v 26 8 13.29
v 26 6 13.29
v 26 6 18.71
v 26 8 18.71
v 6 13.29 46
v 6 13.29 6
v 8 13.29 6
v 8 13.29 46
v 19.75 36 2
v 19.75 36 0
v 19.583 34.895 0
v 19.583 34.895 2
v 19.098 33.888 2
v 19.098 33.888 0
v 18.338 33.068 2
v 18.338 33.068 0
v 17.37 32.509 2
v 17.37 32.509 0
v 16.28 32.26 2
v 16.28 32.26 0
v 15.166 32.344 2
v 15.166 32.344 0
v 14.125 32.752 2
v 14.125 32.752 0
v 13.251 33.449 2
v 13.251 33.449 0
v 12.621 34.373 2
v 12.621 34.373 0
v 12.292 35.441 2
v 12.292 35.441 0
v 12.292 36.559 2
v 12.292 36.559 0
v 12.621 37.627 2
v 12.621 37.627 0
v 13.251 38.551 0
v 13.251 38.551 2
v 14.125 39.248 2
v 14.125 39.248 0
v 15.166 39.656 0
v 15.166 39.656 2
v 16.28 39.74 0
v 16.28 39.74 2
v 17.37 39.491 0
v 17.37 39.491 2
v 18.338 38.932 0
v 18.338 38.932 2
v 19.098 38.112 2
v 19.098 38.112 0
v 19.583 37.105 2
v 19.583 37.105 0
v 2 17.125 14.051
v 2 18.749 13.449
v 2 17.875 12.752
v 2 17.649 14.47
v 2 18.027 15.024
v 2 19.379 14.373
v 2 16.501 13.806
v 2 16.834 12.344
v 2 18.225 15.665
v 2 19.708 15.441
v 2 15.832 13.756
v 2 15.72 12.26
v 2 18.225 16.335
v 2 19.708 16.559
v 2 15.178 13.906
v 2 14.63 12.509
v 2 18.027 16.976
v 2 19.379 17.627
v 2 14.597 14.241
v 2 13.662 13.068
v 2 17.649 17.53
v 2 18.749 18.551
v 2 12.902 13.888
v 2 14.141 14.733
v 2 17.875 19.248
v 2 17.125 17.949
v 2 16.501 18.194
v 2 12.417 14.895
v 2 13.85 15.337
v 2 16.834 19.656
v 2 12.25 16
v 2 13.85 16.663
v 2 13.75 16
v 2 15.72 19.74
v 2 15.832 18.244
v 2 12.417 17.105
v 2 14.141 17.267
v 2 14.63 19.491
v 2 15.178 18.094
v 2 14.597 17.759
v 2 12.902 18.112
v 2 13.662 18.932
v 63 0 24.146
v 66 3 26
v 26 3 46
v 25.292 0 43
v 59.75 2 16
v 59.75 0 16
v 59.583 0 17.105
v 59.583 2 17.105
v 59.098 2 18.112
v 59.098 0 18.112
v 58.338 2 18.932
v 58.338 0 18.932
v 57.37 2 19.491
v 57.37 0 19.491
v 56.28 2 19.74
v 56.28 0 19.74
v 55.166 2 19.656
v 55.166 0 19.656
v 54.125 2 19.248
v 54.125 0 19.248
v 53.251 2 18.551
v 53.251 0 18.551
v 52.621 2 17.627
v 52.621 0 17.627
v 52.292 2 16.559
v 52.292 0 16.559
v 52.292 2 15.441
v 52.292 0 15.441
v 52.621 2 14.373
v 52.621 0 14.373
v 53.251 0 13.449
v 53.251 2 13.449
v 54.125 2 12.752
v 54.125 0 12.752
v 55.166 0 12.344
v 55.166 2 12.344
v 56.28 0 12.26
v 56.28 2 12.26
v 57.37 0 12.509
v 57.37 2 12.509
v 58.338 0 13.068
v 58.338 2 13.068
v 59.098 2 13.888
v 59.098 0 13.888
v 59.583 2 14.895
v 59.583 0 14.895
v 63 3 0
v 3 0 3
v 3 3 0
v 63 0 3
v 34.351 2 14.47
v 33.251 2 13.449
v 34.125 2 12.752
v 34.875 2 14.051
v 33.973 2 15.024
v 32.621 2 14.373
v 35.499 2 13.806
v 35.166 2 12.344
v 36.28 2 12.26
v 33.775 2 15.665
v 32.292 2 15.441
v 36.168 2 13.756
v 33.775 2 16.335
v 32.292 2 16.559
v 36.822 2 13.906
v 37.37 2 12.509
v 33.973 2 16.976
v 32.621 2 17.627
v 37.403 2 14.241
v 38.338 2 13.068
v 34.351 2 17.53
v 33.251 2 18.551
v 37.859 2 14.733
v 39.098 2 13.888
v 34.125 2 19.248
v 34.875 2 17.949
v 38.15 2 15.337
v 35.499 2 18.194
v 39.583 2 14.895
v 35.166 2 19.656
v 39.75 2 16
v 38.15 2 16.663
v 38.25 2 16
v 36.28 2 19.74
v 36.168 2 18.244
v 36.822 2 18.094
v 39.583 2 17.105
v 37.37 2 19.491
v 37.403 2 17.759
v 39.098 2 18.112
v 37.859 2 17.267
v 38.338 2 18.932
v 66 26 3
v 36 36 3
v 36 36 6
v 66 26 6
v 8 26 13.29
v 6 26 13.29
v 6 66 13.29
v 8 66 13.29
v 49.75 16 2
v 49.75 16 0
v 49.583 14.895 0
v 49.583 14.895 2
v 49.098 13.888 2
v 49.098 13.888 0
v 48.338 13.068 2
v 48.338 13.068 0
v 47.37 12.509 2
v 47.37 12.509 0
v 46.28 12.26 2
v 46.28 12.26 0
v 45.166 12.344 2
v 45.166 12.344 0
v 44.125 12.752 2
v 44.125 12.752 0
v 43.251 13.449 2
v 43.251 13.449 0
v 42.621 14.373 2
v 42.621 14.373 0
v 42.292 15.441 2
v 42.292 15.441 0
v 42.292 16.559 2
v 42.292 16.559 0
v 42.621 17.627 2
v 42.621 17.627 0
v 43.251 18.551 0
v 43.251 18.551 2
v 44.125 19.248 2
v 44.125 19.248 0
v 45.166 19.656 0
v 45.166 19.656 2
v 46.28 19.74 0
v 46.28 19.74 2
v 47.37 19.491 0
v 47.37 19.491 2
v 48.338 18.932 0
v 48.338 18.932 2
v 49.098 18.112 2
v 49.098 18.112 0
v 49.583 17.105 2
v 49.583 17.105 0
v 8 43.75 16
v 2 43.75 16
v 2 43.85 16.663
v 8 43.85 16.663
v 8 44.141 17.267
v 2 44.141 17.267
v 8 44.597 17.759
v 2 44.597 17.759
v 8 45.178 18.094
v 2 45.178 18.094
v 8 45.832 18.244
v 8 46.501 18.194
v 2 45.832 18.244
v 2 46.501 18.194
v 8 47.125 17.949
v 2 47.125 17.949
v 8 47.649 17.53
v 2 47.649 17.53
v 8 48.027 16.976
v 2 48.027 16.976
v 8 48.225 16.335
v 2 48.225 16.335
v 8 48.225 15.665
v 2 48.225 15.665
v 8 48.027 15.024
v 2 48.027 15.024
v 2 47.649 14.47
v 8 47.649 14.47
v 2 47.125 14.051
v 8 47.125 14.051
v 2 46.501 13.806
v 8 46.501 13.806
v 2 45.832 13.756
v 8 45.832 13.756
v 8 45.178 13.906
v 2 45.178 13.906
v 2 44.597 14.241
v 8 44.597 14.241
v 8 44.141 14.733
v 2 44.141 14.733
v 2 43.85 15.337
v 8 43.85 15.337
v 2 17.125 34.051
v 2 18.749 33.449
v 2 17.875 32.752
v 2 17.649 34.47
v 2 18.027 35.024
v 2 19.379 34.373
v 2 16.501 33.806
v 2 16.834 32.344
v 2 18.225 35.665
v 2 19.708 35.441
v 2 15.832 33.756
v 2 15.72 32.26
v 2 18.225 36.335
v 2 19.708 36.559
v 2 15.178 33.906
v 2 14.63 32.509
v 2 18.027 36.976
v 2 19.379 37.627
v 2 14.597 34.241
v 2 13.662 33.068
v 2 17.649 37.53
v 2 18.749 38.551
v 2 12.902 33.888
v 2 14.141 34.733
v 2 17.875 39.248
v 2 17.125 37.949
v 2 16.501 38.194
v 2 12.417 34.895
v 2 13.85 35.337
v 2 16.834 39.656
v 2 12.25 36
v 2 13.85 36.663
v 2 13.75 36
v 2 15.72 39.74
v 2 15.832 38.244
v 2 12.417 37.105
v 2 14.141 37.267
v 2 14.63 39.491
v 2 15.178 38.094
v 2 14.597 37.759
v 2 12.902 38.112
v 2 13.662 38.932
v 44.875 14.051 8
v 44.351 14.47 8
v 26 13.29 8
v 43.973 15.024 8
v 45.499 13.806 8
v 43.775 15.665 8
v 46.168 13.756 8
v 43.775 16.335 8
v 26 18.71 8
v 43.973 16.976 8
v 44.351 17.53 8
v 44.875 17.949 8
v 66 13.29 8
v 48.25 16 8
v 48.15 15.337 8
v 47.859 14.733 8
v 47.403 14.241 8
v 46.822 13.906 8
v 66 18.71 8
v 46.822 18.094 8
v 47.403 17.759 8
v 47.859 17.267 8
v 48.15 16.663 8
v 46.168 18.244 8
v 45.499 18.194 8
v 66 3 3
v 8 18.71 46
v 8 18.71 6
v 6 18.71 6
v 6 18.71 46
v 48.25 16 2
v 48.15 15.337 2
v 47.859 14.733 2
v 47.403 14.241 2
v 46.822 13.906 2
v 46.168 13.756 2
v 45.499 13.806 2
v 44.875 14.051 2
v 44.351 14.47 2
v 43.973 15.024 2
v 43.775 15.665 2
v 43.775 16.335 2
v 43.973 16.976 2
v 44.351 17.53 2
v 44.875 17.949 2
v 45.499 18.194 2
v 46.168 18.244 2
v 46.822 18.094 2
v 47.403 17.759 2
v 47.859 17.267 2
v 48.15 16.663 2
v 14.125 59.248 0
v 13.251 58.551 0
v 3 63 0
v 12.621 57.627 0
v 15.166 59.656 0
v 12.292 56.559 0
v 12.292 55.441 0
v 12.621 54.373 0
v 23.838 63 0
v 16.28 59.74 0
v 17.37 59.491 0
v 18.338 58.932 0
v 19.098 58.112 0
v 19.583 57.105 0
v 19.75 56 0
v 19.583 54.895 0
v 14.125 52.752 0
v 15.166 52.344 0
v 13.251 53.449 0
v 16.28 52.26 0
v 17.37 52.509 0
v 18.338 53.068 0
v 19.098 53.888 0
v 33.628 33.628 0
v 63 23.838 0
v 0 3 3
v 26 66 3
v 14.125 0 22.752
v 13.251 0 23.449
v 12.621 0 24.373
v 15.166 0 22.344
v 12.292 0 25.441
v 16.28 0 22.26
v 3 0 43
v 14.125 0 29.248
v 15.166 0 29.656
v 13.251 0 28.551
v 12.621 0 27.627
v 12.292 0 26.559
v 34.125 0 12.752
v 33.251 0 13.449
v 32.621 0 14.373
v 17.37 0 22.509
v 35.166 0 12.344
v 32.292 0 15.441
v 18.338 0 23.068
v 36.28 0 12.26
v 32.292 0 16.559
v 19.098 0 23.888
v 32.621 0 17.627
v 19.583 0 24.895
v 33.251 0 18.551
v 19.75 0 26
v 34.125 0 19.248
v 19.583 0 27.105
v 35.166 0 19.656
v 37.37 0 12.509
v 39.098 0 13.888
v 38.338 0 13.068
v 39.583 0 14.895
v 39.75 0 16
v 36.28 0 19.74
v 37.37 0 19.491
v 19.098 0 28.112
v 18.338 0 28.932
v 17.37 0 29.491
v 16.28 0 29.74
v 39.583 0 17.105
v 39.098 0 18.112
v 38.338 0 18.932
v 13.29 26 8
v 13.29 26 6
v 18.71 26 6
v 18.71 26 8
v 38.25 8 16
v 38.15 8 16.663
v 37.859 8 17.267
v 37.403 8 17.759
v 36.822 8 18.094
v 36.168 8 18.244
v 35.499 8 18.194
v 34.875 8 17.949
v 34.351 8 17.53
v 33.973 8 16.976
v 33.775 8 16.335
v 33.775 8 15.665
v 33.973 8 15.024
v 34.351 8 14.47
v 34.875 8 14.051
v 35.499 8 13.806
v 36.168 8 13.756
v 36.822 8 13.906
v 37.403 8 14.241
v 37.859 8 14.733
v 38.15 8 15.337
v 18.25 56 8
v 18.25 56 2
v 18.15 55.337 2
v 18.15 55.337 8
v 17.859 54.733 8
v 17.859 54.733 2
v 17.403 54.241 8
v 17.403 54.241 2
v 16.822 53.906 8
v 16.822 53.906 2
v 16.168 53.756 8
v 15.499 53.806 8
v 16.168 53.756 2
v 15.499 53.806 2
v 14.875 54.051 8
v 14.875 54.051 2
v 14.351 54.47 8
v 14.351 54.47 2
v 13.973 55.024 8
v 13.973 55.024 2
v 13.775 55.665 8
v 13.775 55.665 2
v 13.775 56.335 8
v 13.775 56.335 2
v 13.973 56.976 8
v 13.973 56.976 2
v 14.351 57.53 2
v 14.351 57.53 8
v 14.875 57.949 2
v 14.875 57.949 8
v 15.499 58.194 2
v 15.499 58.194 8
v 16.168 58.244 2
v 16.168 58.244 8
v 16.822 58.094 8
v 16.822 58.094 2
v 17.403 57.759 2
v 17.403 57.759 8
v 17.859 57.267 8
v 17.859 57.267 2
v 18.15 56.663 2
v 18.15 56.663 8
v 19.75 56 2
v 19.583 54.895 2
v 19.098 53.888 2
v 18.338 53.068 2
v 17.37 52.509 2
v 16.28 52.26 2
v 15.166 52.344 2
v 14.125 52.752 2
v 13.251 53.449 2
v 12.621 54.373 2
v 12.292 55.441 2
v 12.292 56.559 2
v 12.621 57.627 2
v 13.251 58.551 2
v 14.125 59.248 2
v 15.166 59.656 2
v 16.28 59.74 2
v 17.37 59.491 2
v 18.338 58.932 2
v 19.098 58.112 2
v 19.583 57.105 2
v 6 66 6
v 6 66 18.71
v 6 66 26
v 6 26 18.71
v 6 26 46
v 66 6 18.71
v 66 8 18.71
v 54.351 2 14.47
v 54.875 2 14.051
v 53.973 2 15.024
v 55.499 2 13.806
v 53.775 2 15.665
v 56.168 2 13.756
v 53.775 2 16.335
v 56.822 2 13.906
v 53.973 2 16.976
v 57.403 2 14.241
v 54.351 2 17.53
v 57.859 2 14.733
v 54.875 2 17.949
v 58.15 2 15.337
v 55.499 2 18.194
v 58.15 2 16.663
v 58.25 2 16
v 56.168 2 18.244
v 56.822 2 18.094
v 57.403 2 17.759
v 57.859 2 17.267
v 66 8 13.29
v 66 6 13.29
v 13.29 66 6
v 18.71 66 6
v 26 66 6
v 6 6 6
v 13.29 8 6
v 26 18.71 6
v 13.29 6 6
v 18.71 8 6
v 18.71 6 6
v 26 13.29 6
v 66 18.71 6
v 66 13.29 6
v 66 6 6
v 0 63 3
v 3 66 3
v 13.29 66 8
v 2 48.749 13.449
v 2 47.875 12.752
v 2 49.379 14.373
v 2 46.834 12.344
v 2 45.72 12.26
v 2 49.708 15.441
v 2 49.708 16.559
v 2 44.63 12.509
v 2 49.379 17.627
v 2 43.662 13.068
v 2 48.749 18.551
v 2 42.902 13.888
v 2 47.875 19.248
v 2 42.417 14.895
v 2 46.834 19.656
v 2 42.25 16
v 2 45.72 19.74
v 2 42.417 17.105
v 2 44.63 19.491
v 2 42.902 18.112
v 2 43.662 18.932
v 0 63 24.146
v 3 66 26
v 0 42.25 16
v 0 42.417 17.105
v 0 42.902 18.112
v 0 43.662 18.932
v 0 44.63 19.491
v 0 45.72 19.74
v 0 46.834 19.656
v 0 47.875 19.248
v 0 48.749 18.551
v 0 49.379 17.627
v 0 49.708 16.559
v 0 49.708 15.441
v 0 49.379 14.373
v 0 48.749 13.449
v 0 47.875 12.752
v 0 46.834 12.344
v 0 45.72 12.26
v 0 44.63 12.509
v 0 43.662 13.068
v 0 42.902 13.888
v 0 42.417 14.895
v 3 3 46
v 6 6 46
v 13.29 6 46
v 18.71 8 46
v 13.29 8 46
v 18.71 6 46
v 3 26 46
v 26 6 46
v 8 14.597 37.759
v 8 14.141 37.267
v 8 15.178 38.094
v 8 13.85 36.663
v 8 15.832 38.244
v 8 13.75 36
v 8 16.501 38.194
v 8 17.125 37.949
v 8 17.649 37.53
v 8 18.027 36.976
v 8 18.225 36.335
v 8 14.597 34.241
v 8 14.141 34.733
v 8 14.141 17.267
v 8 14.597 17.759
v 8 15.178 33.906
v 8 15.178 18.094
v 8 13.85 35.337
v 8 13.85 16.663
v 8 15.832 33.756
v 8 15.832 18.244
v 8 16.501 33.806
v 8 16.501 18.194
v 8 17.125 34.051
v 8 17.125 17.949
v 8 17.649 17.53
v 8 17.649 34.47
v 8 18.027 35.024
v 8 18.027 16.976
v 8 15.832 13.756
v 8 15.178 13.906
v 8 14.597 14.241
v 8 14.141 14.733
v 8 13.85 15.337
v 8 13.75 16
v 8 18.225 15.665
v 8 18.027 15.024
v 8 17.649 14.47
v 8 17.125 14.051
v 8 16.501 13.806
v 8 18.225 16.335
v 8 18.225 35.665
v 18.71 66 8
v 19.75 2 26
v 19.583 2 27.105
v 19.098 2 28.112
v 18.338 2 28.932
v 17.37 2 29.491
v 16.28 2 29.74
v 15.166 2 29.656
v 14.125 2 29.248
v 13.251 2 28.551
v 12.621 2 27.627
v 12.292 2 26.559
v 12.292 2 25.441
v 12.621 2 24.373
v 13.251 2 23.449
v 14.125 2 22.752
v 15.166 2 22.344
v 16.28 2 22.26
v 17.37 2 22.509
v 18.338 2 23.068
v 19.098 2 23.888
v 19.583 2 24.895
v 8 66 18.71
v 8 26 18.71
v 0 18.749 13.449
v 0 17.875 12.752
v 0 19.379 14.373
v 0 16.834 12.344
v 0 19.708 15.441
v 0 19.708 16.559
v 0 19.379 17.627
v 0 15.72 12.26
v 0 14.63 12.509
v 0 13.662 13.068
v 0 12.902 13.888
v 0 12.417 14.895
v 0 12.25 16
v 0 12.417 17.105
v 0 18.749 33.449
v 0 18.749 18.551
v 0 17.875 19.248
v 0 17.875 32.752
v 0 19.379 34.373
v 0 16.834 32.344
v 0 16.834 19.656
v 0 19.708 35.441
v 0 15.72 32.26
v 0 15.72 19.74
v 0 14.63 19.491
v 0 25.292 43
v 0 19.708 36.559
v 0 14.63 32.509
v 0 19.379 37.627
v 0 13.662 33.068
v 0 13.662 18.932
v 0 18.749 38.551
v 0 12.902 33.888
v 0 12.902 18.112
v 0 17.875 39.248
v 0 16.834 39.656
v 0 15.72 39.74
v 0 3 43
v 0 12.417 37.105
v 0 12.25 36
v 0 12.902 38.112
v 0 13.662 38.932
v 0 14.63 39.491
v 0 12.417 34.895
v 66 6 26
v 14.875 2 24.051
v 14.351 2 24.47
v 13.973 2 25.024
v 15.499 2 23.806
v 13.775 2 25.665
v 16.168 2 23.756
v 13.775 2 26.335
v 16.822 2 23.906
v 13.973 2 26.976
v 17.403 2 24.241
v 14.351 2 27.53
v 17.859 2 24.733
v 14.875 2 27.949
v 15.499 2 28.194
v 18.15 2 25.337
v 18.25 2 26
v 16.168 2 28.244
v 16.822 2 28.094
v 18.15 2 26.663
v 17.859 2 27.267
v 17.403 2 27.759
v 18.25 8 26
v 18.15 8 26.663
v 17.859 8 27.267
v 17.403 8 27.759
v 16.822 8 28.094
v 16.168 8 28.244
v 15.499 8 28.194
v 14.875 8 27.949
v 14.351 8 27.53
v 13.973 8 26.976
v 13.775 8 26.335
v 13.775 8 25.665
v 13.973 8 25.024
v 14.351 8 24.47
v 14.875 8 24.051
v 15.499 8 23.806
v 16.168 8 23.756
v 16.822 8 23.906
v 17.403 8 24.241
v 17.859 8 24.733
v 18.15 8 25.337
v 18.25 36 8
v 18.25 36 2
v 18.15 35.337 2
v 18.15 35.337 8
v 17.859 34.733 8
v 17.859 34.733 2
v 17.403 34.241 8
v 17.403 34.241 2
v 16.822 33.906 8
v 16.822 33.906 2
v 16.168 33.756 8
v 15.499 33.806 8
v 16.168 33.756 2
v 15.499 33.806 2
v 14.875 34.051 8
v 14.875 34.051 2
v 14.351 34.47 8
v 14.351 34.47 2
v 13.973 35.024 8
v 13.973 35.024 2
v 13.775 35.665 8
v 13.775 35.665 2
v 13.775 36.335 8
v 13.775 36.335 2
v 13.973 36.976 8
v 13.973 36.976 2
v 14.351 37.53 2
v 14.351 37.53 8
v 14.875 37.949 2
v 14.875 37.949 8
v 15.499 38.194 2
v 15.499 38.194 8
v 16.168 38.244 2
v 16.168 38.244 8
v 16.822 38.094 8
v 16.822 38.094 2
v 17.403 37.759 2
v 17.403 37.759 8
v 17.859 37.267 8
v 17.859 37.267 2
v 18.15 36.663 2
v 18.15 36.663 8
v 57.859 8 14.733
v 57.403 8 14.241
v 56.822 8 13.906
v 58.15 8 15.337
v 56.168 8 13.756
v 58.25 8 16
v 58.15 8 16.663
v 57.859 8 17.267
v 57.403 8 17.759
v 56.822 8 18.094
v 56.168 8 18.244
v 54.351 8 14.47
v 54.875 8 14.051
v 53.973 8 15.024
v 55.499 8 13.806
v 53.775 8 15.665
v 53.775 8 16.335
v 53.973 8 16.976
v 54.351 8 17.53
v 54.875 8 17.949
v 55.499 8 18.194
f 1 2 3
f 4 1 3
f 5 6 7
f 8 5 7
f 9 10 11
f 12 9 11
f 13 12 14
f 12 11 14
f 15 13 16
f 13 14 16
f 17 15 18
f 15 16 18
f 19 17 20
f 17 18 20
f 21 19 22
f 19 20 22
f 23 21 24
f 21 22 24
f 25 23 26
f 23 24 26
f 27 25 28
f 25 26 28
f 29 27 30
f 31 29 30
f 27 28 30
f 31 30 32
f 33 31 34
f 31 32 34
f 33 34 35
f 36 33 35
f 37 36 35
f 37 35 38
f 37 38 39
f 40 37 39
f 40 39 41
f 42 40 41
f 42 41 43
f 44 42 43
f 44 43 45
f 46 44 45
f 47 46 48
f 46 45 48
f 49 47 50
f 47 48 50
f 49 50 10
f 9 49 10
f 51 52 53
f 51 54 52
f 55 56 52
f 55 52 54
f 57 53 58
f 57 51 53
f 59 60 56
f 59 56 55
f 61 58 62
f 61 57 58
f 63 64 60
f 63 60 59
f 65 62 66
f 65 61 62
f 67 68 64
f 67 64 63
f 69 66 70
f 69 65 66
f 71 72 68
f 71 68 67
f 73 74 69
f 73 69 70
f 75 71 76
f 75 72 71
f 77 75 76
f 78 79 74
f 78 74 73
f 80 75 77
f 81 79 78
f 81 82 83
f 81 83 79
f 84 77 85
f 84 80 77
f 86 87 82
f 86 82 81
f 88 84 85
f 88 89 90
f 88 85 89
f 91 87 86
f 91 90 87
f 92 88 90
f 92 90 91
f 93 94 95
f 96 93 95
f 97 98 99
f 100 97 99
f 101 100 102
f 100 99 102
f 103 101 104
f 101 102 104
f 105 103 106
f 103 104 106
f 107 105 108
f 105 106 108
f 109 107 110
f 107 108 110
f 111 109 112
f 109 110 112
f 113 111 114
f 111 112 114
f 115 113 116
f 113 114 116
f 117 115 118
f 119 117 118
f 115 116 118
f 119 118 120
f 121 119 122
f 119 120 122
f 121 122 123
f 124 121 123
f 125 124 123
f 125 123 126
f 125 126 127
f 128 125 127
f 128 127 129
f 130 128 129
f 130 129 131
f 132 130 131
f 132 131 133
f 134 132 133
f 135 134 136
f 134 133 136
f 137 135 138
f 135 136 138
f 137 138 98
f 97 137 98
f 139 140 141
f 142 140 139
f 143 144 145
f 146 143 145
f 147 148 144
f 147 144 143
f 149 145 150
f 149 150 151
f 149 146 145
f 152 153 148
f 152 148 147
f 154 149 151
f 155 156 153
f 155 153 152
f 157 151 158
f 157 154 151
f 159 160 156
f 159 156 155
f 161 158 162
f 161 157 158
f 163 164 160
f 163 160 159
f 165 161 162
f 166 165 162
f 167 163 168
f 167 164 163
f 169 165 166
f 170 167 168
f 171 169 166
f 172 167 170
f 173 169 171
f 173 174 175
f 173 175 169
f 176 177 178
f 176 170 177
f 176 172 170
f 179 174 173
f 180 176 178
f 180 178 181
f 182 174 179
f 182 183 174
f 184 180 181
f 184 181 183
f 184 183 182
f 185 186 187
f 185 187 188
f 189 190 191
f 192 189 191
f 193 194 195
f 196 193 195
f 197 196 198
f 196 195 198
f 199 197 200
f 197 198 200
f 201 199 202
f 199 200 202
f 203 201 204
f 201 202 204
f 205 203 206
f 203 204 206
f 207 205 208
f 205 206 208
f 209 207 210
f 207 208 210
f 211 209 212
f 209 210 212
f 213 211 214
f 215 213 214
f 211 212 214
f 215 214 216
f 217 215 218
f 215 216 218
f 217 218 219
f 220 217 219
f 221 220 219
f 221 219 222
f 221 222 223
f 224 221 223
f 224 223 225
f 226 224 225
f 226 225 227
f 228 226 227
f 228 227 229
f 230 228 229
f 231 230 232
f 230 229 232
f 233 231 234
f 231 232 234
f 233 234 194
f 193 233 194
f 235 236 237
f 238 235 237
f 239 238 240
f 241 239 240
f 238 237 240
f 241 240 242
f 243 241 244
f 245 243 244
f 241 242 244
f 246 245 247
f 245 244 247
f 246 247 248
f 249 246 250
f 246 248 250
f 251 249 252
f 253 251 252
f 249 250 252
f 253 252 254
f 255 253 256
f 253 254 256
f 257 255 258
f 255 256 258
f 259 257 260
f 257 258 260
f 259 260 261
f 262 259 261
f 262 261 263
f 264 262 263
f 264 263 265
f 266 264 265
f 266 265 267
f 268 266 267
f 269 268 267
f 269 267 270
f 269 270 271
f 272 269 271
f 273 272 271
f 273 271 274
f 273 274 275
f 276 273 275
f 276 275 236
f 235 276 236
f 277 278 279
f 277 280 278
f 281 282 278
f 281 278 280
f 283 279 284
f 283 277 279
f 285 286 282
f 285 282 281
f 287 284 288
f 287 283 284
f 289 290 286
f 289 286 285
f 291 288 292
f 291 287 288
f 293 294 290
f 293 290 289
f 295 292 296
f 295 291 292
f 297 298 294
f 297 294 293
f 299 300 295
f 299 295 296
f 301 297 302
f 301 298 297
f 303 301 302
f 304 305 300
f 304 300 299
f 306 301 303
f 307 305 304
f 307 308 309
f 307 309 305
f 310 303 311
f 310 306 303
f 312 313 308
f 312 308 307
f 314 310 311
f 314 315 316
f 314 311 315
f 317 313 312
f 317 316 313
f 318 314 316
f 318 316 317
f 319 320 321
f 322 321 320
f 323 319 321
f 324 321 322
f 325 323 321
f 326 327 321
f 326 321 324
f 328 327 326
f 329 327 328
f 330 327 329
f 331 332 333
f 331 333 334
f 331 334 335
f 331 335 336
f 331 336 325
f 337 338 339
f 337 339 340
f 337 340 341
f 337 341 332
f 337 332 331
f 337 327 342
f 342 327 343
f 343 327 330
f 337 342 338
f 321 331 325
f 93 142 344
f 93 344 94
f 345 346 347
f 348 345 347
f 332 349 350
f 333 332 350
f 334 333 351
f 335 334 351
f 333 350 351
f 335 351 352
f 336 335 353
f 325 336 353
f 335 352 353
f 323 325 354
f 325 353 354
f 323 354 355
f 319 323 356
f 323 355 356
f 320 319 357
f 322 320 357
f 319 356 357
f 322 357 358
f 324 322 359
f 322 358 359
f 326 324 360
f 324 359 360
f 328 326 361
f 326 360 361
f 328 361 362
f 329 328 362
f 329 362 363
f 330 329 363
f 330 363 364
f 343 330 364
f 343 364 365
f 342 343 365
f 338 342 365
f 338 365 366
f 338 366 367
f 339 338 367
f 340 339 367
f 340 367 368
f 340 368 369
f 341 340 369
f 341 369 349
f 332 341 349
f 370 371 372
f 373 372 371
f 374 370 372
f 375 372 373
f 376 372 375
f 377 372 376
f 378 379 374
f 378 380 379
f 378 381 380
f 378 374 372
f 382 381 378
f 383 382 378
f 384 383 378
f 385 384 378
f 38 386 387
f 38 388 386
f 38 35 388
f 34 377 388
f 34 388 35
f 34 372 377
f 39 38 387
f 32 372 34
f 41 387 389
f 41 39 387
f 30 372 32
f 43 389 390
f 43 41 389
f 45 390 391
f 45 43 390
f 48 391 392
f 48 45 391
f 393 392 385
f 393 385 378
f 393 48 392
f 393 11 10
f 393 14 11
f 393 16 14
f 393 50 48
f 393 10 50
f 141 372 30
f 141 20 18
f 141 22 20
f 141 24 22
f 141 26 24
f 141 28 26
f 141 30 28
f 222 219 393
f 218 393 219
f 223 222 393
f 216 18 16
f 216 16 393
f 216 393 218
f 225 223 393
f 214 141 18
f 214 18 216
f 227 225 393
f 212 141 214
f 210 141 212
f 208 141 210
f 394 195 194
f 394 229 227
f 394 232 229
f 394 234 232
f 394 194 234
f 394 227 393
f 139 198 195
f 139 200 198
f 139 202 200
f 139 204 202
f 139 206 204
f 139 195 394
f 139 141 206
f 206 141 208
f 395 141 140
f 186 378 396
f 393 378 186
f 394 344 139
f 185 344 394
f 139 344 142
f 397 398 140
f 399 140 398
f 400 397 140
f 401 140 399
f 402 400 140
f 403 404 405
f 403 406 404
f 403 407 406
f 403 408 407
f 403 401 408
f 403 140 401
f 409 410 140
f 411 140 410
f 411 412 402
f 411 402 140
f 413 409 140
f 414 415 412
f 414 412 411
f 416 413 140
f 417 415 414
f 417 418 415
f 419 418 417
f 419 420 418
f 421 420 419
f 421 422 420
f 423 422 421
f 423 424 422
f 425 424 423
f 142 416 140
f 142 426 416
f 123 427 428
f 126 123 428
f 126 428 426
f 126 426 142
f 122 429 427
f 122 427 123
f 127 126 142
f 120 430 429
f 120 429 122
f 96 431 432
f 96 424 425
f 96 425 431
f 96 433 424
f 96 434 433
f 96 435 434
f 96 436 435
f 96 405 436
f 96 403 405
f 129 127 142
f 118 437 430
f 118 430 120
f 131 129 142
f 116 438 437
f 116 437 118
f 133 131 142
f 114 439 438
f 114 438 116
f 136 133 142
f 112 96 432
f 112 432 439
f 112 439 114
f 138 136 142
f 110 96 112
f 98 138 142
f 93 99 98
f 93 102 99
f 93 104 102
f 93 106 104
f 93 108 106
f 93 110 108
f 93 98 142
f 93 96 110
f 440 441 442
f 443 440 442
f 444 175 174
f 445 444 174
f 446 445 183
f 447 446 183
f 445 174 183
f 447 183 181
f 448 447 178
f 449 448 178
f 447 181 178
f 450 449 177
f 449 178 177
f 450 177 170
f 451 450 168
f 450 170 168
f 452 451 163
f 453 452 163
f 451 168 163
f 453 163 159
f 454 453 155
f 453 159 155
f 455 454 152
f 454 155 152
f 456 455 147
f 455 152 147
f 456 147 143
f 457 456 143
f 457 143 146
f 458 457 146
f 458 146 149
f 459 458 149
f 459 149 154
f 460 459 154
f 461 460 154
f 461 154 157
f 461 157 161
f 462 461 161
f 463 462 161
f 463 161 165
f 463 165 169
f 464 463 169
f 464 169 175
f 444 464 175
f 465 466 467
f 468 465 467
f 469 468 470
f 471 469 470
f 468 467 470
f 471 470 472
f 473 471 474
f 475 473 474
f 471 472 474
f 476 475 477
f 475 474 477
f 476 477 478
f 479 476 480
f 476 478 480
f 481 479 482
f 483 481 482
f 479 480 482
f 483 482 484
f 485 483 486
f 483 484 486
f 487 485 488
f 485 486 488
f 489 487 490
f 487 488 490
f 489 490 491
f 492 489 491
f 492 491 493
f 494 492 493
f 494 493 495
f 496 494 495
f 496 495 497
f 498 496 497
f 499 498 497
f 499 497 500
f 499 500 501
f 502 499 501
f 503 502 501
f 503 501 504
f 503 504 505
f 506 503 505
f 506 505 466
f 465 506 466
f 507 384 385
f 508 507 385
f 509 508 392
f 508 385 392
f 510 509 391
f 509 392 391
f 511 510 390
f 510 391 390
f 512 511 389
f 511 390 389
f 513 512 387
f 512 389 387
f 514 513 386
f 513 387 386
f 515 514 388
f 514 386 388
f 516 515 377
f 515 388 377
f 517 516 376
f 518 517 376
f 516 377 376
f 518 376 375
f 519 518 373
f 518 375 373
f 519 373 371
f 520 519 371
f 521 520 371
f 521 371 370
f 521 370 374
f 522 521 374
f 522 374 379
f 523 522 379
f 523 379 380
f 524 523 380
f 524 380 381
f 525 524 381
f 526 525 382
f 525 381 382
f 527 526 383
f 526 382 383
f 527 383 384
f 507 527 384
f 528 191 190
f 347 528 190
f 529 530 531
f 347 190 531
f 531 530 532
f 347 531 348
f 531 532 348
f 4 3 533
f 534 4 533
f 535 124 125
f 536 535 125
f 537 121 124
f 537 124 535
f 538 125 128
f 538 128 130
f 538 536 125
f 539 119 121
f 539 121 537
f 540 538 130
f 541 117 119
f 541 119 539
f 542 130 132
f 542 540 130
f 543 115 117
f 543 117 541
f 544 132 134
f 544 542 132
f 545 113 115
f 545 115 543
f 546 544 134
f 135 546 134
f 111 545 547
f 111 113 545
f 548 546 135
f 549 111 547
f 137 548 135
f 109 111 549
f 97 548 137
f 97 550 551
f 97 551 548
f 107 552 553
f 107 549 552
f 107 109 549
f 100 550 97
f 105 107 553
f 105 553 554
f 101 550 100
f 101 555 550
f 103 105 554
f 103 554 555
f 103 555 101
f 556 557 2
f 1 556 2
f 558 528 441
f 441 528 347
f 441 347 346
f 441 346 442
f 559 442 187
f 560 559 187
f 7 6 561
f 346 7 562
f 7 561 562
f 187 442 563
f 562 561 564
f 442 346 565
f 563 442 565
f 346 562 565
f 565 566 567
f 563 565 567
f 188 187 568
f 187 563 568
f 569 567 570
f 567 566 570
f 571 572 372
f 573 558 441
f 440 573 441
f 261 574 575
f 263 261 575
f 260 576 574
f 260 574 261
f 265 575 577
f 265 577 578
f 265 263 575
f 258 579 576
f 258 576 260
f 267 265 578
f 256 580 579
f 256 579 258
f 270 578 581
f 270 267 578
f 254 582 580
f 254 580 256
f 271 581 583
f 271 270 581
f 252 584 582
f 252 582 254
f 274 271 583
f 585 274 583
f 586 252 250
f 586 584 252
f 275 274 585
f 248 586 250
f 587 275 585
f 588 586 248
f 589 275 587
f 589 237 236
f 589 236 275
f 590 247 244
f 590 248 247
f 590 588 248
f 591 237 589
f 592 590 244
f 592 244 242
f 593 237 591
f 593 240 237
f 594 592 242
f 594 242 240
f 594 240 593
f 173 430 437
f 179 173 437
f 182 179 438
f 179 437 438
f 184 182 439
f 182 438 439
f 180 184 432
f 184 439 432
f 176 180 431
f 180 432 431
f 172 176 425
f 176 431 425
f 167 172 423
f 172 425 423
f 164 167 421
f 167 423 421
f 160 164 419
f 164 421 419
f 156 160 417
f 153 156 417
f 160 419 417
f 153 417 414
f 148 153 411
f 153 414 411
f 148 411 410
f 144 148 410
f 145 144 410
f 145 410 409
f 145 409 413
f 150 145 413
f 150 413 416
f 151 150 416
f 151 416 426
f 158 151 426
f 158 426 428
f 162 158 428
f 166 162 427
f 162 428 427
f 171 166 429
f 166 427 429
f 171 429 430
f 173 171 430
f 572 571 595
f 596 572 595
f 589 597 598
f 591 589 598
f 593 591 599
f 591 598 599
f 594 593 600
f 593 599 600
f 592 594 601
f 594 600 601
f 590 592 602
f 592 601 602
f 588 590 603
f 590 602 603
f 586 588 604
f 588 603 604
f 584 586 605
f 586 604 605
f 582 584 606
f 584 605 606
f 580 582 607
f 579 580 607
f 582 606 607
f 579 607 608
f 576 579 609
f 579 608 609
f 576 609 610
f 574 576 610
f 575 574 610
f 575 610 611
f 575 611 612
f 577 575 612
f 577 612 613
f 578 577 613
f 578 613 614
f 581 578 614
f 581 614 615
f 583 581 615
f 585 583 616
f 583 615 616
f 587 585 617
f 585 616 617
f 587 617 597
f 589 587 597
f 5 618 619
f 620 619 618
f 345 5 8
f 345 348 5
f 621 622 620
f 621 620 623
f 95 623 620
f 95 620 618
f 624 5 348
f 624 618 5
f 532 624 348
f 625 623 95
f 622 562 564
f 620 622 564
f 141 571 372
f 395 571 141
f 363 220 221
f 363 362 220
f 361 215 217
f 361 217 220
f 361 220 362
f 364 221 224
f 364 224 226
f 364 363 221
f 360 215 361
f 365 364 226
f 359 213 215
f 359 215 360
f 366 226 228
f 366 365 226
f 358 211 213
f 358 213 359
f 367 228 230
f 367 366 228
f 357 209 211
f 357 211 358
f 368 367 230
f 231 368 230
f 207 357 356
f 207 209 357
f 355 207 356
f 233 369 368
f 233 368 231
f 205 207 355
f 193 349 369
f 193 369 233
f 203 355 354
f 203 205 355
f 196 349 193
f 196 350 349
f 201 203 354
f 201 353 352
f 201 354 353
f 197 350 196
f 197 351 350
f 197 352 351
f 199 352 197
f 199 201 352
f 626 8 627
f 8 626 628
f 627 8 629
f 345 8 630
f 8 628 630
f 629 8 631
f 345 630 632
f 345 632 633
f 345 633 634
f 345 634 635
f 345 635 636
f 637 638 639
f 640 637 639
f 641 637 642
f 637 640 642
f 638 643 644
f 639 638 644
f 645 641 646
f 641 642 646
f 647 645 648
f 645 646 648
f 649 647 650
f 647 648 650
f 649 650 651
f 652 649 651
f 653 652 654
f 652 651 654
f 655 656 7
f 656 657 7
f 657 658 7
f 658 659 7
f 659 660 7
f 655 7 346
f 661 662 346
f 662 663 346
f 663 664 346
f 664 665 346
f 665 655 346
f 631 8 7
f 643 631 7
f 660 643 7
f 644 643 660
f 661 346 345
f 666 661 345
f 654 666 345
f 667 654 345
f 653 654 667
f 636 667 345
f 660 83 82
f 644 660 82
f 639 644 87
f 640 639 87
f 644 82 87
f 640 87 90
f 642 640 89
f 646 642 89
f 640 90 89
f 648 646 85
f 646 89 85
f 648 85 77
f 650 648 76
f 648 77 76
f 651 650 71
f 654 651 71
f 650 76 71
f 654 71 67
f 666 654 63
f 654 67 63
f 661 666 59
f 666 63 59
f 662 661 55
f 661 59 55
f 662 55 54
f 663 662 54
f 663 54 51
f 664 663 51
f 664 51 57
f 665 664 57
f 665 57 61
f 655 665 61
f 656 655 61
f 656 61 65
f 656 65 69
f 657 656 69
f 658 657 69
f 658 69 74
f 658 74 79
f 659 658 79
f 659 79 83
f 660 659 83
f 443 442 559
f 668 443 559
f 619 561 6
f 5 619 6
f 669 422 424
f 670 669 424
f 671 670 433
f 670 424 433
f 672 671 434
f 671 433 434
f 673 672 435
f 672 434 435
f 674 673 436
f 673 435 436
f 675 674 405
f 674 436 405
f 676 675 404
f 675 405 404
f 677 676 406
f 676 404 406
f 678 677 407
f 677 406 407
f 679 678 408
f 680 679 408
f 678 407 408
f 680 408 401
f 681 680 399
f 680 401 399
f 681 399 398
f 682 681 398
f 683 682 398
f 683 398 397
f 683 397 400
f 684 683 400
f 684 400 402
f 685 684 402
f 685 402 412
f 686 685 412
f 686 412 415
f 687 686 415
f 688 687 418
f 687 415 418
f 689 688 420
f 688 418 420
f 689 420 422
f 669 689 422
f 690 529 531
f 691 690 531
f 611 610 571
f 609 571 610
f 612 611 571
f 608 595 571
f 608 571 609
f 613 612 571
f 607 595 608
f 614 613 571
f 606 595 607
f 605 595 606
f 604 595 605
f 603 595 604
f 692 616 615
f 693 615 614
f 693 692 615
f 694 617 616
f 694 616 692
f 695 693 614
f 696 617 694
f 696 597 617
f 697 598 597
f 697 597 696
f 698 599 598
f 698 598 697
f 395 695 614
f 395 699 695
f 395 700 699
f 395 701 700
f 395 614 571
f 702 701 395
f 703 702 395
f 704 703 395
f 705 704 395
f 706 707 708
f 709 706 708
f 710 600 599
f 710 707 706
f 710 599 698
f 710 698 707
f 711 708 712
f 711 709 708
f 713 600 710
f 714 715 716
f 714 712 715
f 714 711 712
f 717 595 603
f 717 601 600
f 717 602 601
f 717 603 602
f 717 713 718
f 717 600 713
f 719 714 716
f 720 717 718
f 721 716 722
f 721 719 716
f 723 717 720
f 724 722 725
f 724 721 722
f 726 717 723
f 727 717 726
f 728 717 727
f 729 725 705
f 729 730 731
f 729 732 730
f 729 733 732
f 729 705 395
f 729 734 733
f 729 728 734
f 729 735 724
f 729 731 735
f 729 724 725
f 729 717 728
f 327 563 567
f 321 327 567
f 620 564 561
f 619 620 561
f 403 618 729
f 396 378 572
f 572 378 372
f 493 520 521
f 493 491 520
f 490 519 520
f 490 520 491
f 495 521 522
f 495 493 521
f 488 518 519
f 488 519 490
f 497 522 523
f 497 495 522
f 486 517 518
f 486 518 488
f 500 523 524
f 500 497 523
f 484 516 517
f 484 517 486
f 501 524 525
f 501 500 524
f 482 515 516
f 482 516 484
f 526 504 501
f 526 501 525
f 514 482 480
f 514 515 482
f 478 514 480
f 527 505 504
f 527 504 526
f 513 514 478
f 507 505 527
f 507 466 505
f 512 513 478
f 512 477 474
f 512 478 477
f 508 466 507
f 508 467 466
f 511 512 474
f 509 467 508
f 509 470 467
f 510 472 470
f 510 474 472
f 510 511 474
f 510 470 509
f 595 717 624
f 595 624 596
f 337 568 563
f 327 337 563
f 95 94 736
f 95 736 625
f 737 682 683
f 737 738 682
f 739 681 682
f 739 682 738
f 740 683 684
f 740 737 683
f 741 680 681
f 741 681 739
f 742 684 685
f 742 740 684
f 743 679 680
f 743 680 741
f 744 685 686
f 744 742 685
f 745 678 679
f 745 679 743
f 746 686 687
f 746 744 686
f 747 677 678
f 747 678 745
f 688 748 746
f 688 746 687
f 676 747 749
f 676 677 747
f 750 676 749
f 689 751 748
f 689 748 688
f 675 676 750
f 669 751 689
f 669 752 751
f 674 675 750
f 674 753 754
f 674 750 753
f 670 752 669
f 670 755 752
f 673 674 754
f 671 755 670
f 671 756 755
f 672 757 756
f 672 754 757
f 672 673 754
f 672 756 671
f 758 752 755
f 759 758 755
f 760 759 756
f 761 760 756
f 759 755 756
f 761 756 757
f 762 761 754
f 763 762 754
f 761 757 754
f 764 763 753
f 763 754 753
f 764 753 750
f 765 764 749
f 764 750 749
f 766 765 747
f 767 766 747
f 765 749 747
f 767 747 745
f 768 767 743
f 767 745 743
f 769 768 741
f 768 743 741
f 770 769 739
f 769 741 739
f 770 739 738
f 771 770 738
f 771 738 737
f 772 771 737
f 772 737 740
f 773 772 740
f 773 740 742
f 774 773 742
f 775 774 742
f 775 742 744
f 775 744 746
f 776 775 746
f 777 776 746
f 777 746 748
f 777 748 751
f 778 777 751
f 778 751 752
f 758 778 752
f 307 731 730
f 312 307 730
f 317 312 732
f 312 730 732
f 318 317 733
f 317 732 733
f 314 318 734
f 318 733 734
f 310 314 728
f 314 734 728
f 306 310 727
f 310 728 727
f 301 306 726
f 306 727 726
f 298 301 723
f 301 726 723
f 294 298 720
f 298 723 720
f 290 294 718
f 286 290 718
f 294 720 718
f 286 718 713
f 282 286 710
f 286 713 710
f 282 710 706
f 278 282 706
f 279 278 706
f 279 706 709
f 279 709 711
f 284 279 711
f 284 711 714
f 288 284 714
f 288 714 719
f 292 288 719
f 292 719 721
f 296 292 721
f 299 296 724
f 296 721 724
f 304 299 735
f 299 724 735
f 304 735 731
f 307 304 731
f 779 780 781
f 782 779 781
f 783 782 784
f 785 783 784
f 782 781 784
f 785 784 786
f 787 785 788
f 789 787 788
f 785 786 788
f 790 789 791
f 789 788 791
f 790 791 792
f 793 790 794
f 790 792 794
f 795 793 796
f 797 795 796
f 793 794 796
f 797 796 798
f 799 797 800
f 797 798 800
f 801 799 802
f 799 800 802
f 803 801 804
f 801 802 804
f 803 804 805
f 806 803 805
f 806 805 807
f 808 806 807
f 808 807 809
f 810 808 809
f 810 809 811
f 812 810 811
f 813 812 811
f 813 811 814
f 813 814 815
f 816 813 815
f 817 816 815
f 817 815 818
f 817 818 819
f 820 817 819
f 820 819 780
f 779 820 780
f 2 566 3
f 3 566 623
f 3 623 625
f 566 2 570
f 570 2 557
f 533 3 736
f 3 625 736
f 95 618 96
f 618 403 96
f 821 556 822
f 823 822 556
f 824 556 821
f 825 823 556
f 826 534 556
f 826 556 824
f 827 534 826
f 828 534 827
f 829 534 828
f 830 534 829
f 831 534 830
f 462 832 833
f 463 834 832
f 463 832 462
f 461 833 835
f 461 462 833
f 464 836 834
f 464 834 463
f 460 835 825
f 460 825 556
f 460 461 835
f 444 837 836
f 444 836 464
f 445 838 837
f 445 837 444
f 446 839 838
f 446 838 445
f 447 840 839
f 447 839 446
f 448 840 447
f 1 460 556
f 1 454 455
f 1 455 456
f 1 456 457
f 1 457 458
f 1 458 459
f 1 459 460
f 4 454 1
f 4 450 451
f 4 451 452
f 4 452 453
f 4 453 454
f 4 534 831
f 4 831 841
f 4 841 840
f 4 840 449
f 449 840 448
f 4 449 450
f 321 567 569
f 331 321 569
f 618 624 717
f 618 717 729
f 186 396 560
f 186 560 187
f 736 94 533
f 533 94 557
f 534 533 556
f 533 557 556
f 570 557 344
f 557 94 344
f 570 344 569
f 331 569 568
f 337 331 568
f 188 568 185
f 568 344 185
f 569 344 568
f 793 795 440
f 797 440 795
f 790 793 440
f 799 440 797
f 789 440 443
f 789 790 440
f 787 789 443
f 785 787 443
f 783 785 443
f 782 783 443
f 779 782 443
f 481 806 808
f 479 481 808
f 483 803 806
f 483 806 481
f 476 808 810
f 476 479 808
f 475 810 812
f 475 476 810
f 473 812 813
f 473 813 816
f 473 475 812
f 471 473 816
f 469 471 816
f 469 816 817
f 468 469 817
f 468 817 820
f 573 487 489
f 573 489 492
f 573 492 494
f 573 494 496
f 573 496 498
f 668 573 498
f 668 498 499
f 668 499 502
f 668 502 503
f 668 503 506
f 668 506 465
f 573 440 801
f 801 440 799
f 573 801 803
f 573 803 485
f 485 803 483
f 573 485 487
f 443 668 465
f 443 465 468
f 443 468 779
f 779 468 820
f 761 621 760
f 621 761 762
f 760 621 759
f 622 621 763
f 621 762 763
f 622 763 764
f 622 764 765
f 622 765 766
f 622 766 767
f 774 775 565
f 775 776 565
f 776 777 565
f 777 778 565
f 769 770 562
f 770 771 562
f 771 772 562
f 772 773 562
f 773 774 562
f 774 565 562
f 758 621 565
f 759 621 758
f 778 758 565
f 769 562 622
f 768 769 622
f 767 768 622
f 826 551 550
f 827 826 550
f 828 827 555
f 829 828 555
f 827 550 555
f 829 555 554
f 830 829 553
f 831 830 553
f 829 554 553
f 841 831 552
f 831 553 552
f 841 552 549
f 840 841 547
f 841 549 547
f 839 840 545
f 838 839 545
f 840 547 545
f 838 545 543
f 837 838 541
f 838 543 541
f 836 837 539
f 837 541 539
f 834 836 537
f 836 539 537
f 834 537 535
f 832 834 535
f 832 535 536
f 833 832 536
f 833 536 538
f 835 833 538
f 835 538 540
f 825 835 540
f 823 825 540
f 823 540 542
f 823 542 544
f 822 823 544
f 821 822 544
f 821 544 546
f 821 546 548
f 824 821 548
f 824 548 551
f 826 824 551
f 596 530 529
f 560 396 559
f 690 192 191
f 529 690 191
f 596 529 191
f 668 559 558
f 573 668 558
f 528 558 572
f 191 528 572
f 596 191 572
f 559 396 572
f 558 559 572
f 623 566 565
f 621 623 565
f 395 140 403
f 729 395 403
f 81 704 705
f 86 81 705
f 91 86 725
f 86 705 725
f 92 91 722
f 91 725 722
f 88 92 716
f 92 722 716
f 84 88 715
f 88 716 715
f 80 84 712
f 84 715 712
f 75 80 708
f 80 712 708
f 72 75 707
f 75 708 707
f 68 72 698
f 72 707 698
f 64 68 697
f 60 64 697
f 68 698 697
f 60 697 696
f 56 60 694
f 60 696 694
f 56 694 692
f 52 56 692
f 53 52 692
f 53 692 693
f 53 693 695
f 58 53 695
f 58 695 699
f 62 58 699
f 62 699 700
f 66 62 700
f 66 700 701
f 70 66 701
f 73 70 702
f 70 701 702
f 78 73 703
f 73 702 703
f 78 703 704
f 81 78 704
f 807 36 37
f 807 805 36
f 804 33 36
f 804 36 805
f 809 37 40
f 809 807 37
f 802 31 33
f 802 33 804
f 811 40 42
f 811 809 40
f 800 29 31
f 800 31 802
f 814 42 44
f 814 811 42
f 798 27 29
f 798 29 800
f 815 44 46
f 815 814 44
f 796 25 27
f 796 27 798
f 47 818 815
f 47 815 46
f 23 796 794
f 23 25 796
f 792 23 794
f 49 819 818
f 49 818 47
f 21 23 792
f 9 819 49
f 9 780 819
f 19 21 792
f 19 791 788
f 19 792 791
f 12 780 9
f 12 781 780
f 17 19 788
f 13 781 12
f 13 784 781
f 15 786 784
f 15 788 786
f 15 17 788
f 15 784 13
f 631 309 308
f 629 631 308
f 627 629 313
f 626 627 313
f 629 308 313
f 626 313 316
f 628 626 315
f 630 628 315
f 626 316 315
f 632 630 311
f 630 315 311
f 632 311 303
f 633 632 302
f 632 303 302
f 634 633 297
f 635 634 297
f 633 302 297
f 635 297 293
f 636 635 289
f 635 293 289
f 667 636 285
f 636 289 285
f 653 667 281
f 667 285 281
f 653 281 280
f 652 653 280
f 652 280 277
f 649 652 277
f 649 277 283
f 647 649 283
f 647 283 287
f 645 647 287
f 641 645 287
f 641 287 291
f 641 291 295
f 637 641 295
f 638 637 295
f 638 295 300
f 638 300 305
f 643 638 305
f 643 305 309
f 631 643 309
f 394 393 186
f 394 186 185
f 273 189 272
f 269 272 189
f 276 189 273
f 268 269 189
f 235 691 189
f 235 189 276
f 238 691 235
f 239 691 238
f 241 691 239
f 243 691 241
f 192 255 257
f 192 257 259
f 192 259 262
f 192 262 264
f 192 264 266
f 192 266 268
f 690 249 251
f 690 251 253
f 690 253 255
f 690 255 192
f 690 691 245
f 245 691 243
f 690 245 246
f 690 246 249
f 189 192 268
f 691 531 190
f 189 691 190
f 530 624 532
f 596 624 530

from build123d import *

# Parameters (mm, degrees)
F1_DEPTH  = 6
F3_DEPTH  = 20
F5_DEPTH  = 20
F7_DEPTH  = 40
F9_DEPTH  = 2
F11_DEPTH = 2
F13_DEPTH = 2
F14_R     = 2.25
F15_DEPTH = 8
F16_R     = 2.25
F17_DEPTH = 8
F18_R     = 2.25
F19_DEPTH = 8
F20_R     = 3.75
F21_DEPTH = 2
F22_R     = 3.75
F23_DEPTH = 2
F24_R     = 3.75
F25_DEPTH = 2
F27_DEPTH = 6
F29_DEPTH = 6
F31_DEPTH = 6
F32_SIZE  = 3


with BuildPart() as f1:
    # F0 (on Top) → F1 (new body)
    with BuildSketch(Plane.XY):
        Polygon((0, 66), (0, 0), (66, 0), (66, 26), (26, 26), (26, 66), align=None)
    extrude(amount=F1_DEPTH)

    # F2 (on face) → F3 (join)
    with BuildSketch(Plane.XY.offset(6)):
        Polygon((6, 66), (0, 66), (0, 0), (66, 0), (66, 6), (6, 6), align=None)
    extrude(amount=F3_DEPTH)

    # F4 (on face) → F5 (join)
    with BuildSketch(Plane.XY.offset(26)):
        Polygon((6, 6), (6, 26), (0, 26), (0, 0), (26, 0), (26, 6), align=None)
    extrude(amount=F5_DEPTH)

    # F6 (on face) → F7 (join)
    with BuildSketch(Plane.XY.offset(6)):
        Polygon((13.29, 6), (16, 6), (18.71, 6), (18.71, 8), (13.29, 8), align=None)
        Polygon((6, 18.71), (6, 16), (6, 13.29), (8, 13.29), (8, 18.71), align=None)
    extrude(amount=F7_DEPTH)

    # F8 (on face) → F9 (join)
    with BuildSketch(Plane.XY.offset(6)):
        Polygon((66, 13.29), (66, 16), (66, 18.71), (26, 18.71), (26, 13.29), align=None)
        Polygon((18.71, 66), (16, 66), (13.29, 66), (13.29, 26), (18.71, 26), align=None)
    extrude(amount=F9_DEPTH)

    # F10 (on face) → F11 (join)
    with BuildSketch(Plane(origin=(0, 6, 0), x_dir=(-1, 0, 0), z_dir=(0, 1, 0))):
        Polygon((-66, 18.71), (-66, 16), (-66, 13.29), (-26, 13.29), (-26, 16), (-26, 18.71), align=None)
    extrude(amount=F11_DEPTH)

    # F12 (on face) → F13 (join)
    with BuildSketch(Plane.YZ.offset(6)):
        Polygon((66, 13.29), (66, 16), (66, 18.71), (26, 18.71), (26, 13.29), align=None)
    extrude(amount=F13_DEPTH)

    # F14 (on face) → F15 (cut, through all)
    with BuildSketch(Plane.XZ):
        with Locations((56, 16)):
            Circle(F14_R)
        with Locations((16, 26)):
            Circle(F14_R)
        with Locations((36, 16)):
            Circle(F14_R)
    extrude(amount=-F15_DEPTH, mode=Mode.SUBTRACT)

    # F16 (on face) → F17 (cut, through all)
    with BuildSketch(Plane(origin=(0, 0, 0), x_dir=(0, -1, 0), z_dir=(-1, 0, 0))):
        with Locations((-16, 36)):
            Circle(F16_R)
        with Locations((-46, 16)):
            Circle(F16_R)
        with Locations((-16, 16)):
            Circle(F16_R)
    extrude(amount=-F17_DEPTH, mode=Mode.SUBTRACT)

    # F18 (on face) → F19 (cut, through all)
    with BuildSketch(Plane(origin=(0, 0, 0), x_dir=(1, 0, 0), z_dir=(0, 0, -1))):
        with Locations((46, -16)):
            Circle(F18_R)
        with Locations((16, -56)):
            Circle(F18_R)
        with Locations((16, -36)):
            Circle(F18_R)
    extrude(amount=-F19_DEPTH, mode=Mode.SUBTRACT)

    # F20 (on face) → F21 (cut)
    with BuildSketch(Plane.XZ):
        with Locations((16, 26)):
            Circle(F20_R)
        with Locations((36, 16)):
            Circle(F20_R)
        with Locations((56, 16)):
            Circle(F20_R)
    extrude(amount=-F21_DEPTH, mode=Mode.SUBTRACT)

    # F22 (on face) → F23 (cut)
    with BuildSketch(Plane(origin=(0, 0, 0), x_dir=(0, -1, 0), z_dir=(-1, 0, 0))):
        with Locations((-16, 36)):
            Circle(F22_R)
        with Locations((-46, 16)):
            Circle(F22_R)
        with Locations((-16, 16)):
            Circle(F22_R)
    extrude(amount=-F23_DEPTH, mode=Mode.SUBTRACT)

    # F24 (on face) → F25 (cut)
    with BuildSketch(Plane(origin=(0, 0, 0), x_dir=(1, 0, 0), z_dir=(0, 0, -1))):
        with Locations((16, -56)):
            Circle(F24_R)
        with Locations((46, -16)):
            Circle(F24_R)
        with Locations((16, -36)):
            Circle(F24_R)
    extrude(amount=-F25_DEPTH, mode=Mode.SUBTRACT)

    # F26 (on face) → F27 (join)
    with BuildSketch(Plane.XZ):
        Polygon((66, 26), (26, 46), (26, 26), align=None)
    extrude(amount=-F27_DEPTH)

    # F28 (on face) → F29 (join)
    with BuildSketch(Plane(origin=(0, 0, 0), x_dir=(0, -1, 0), z_dir=(-1, 0, 0))):
        Polygon((-26, 46), (-66, 26), (-26, 26), align=None)
    extrude(amount=-F29_DEPTH)

    # F30 (on face) → F31 (join)
    with BuildSketch(Plane(origin=(0, 0, 0), x_dir=(1, 0, 0), z_dir=(0, 0, -1))):
        Polygon((26, -26), (26, -66), (36, -36), (66, -26), align=None)
    extrude(amount=-F31_DEPTH)

    # F32
    f32_edges = [f1.edges().sort_by_distance(p)[0] for p in [
        (46, 0, 36),
        (13, 0, 46),
        (0, 13, 46),
        (0, 46, 36),
        (31, 51, 0),
        (51, 31, 0),
        (13, 66, 0),
        (66, 13, 0),
        (66, 0, 13),
        (0, 66, 13),
        (33, 0, 0),
        (0, 33, 0),
        (0, 0, 23),
    ]]
    chamfer(f32_edges, length=F32_SIZE)


solid = f1.part
